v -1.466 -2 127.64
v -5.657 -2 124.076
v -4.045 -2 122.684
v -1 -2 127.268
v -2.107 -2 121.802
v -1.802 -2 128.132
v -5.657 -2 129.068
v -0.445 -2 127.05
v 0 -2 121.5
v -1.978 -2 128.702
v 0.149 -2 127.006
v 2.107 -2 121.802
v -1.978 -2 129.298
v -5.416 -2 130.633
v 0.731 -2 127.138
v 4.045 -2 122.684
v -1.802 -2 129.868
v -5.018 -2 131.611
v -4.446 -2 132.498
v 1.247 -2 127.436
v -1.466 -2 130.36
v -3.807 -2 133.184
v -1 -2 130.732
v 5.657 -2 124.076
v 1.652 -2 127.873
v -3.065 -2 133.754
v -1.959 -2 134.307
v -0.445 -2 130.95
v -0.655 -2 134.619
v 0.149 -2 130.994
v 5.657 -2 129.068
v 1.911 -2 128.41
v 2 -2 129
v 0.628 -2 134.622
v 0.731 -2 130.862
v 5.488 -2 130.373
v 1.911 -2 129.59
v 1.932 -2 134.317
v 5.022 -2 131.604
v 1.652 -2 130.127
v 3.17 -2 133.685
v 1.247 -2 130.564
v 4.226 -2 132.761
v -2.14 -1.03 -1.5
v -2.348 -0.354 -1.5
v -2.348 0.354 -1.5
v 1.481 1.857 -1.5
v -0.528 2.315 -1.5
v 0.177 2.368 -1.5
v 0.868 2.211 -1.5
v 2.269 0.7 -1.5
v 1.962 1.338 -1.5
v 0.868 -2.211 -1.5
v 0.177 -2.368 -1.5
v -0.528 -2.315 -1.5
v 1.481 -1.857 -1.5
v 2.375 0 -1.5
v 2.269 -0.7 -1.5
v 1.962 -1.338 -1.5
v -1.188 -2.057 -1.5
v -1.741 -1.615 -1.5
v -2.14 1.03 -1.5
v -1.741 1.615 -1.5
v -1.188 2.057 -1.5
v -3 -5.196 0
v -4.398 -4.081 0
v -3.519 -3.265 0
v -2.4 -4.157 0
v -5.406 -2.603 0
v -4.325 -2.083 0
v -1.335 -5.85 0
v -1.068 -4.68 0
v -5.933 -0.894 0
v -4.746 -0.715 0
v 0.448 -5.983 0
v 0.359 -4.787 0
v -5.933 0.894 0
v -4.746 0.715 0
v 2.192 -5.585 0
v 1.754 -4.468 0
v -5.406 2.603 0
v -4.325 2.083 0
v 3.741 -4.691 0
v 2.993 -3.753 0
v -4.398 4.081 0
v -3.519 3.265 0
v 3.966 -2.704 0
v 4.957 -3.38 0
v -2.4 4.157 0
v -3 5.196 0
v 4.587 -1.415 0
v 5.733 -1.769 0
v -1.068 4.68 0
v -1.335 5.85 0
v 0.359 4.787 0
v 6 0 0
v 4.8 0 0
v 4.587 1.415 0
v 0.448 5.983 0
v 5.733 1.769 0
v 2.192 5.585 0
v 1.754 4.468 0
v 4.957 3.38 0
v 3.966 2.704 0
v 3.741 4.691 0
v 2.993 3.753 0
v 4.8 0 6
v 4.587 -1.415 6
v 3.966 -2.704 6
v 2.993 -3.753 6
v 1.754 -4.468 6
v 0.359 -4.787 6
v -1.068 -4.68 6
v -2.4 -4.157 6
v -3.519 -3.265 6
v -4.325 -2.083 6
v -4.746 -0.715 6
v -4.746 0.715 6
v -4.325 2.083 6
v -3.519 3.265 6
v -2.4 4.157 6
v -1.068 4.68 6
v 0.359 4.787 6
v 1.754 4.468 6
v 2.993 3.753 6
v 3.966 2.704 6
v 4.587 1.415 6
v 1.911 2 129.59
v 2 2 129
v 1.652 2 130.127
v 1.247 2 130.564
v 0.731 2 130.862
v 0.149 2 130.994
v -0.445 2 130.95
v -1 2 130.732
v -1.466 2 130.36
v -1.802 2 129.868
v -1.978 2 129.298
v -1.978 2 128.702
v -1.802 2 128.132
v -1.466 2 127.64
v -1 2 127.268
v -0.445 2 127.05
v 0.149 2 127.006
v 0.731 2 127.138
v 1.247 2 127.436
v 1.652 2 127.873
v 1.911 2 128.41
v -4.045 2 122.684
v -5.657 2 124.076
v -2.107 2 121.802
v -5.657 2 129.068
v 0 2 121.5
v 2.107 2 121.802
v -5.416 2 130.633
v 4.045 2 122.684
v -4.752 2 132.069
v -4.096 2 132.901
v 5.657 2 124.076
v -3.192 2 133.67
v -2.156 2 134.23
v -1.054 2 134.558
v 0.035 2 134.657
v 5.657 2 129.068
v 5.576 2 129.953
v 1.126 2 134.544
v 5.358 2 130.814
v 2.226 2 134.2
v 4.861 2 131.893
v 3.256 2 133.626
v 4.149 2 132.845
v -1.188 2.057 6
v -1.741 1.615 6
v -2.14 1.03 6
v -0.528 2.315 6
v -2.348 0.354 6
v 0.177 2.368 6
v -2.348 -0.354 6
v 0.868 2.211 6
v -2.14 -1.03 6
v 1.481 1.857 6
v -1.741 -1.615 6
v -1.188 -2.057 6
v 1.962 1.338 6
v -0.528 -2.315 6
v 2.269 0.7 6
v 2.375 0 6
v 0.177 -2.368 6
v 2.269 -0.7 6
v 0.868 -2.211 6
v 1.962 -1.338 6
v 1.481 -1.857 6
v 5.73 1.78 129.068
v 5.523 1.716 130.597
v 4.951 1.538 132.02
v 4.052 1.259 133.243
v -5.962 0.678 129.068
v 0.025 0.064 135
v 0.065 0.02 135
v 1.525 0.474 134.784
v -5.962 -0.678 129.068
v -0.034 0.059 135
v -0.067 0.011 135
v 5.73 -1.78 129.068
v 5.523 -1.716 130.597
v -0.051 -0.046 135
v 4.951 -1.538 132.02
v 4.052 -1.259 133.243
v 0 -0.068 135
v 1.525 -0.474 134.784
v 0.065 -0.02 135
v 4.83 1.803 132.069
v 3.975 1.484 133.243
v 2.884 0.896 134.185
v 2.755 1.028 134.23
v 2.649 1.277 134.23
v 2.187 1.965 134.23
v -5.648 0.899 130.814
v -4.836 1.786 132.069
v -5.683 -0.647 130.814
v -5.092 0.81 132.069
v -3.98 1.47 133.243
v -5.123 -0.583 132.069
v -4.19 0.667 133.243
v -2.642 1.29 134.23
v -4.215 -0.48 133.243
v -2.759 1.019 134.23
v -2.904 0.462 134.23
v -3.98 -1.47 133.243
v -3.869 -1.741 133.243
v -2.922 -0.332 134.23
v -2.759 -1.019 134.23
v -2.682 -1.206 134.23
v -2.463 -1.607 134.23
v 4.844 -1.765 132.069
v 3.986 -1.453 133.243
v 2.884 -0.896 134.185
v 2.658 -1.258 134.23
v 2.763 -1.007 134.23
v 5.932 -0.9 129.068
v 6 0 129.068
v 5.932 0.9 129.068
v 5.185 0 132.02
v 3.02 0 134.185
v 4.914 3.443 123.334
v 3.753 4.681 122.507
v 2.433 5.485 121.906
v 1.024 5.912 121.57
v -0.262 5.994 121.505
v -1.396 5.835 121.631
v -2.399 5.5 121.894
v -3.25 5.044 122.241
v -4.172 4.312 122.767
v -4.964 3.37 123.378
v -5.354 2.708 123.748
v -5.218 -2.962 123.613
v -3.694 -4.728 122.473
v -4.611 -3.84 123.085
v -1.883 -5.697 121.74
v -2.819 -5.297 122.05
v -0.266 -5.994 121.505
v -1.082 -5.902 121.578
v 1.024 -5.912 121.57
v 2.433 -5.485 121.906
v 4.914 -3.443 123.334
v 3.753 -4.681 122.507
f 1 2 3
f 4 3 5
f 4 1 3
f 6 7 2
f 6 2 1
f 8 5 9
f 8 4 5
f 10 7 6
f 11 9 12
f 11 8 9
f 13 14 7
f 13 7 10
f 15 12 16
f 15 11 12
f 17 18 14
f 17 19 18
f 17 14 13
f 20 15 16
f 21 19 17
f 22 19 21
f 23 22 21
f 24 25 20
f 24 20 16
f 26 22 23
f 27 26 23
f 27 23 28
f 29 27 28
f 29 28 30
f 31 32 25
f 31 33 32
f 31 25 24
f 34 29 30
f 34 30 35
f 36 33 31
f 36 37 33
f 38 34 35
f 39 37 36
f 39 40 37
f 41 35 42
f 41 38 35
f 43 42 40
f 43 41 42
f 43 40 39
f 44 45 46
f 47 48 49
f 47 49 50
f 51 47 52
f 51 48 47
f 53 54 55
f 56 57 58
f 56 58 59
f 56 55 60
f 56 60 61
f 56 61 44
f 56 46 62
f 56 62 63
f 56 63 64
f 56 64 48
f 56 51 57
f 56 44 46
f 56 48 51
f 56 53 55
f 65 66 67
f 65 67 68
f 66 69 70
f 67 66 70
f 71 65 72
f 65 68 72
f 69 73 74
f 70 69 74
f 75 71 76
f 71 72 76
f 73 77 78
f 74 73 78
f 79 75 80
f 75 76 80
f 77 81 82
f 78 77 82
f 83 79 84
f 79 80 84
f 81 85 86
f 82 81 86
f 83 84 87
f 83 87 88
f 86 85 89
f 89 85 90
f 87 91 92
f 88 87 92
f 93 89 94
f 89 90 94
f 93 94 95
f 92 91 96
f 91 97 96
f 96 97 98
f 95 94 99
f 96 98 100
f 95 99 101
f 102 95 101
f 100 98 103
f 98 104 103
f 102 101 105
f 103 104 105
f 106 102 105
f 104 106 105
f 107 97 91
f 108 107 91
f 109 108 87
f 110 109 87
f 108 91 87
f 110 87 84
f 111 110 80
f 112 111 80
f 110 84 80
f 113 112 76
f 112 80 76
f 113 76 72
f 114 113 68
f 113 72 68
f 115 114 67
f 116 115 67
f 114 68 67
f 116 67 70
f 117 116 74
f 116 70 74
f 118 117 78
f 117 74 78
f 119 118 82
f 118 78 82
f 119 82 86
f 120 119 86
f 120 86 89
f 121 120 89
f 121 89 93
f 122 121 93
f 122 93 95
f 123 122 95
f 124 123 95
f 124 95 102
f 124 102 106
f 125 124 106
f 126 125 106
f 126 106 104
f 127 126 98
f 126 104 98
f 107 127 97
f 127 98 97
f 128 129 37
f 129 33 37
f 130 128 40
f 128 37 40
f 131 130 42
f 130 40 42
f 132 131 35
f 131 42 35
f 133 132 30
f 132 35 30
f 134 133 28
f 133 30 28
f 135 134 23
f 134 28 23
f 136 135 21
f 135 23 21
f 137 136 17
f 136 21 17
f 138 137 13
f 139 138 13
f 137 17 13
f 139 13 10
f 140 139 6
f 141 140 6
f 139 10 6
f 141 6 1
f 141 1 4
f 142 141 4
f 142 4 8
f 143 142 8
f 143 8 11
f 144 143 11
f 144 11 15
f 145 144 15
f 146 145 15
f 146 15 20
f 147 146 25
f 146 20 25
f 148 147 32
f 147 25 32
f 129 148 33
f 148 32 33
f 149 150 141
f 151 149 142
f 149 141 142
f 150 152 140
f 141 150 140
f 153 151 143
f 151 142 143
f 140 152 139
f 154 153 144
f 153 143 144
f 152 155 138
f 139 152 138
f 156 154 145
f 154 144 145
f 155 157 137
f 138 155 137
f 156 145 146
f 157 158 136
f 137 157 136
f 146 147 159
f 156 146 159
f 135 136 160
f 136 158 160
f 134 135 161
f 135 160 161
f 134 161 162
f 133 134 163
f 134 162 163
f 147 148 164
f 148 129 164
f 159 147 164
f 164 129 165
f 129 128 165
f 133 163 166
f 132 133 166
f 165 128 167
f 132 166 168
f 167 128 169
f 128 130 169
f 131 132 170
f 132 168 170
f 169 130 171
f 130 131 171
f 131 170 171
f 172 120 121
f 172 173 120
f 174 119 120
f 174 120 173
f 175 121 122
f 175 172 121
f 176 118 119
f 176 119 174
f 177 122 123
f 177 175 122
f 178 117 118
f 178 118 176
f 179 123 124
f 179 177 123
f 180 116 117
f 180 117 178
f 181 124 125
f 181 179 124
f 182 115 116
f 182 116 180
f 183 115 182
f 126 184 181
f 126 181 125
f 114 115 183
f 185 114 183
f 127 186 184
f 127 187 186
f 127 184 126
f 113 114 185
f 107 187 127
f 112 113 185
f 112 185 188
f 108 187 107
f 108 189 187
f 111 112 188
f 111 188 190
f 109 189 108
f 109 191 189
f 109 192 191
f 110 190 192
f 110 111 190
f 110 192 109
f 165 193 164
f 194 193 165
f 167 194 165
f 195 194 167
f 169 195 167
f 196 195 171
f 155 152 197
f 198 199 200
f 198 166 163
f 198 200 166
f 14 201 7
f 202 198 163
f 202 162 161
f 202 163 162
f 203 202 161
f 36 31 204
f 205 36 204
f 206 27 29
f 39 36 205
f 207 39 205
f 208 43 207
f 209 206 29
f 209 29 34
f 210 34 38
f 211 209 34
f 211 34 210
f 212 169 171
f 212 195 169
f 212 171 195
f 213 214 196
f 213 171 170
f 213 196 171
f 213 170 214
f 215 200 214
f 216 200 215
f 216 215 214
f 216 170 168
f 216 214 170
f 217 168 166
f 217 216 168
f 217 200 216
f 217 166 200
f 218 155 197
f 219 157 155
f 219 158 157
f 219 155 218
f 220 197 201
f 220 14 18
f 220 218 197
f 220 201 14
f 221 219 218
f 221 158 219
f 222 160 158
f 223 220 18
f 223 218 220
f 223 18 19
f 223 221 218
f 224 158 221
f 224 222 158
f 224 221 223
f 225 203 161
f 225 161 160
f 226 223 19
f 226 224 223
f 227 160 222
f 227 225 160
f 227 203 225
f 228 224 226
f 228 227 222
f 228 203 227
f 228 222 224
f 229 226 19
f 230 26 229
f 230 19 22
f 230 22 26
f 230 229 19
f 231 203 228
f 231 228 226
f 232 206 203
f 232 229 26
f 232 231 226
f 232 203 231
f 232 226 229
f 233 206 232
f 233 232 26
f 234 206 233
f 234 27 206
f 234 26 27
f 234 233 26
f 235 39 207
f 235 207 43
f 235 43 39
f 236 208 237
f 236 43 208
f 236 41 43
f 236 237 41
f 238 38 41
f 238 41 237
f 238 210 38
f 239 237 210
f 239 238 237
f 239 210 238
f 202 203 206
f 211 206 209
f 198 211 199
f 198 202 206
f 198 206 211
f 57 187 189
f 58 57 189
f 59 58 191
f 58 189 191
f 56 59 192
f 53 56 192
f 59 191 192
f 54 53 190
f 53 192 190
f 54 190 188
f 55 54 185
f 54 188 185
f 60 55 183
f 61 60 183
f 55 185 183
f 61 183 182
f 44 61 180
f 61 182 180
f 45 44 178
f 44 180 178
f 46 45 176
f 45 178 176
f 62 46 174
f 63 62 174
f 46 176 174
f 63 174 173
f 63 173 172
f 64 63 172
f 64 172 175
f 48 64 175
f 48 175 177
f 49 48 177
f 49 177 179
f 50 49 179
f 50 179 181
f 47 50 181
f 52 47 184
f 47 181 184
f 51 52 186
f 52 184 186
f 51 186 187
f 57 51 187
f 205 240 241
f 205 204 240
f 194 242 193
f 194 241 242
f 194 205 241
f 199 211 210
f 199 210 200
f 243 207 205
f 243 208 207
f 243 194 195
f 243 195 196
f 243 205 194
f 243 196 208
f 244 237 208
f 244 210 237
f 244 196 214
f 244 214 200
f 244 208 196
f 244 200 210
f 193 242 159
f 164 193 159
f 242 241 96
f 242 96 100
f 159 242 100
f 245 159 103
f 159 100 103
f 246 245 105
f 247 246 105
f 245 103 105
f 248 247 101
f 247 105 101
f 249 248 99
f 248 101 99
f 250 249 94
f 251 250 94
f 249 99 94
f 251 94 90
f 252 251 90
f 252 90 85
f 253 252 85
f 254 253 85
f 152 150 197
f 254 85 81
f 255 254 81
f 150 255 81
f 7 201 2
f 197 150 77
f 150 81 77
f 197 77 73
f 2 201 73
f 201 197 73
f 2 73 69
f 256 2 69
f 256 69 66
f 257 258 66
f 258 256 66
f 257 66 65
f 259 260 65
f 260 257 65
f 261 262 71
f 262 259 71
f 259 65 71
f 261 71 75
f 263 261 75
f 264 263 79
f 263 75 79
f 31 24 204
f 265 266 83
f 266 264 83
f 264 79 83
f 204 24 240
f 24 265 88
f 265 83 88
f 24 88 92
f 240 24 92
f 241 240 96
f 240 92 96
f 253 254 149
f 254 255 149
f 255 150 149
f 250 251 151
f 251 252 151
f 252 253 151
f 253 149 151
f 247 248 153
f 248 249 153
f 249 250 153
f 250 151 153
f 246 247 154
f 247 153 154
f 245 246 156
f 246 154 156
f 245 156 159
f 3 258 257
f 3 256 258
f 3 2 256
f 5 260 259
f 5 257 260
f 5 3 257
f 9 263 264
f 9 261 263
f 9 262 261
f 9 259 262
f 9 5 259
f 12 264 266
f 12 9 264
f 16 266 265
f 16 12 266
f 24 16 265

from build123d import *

# Parameters (mm, degrees)
F0_R        = 6
F1_DEPTH    = 135
F3_START    = -2
F3_DEPTH    = 4.0010001005
F4_START    = 2
F4_DEPTH    = 4
F5_T2_ANGLE = 325.4889919963
F5_T4_ANGLE = 306.0016128171
F5_T6_ANGLE = 306.0016128171
F6_R        = 2
F7_DEPTH    = 12.5
F8_R        = 4.8
F9_DEPTH    = 6
F10_R       = 2.375
F11_DEPTH   = 7.5


# Not quite as in the source:
# - a fillet or chamfer that OpenCascade refuses, or shapes differently, is made with other operations: its cross-section is extruded or revolved along the edge and cut away or added


with BuildPart() as f1:
    # F0 (on Top) → F1 (new body)
    with BuildSketch(Plane.XY):
        Circle(F0_R)
    extrude(amount=F1_DEPTH)

    # F2 (on Front) → F3 (cut)
    with BuildSketch(Plane.XZ.offset(F3_START)):
        with BuildLine():
            Line((-6.0225790367, 135.0244730711), (-6.0225790367, 124.5302637944))
            ThreePointArc((-6.0225790367, 124.5302637944), (0.1221735447, 121.5009951577), (6.1649857089, 124.7288232056))
            Line((6.1649857089, 124.7288232056), (6.1649857089, 135.0244730711))
            Line((6.1649857089, 135.0244730711), (-6.0225790367, 135.0244730711))
        make_face()
    extrude(amount=-F3_DEPTH, mode=Mode.SUBTRACT)

    # F2 (on Front) → F4 (cut)
    with BuildSketch(Plane.XZ.offset(F4_START)):
        with BuildLine():
            Line((-6.0225790367, 135.0244730711), (-6.0225790367, 124.5302637944))
            ThreePointArc((-6.0225790367, 124.5302637944), (0.1221735447, 121.5009951577), (6.1649857089, 124.7288232056))
            Line((6.1649857089, 124.7288232056), (6.1649857089, 135.0244730711))
            Line((6.1649857089, 135.0244730711), (-6.0225790367, 135.0244730711))
        make_face()
    extrude(amount=F4_DEPTH, mode=Mode.SUBTRACT)

    # F5: fillet of radius 6 on 3 edges, made by hand

    # F5_s1 → F5_t2 (revolve, cut)
    with BuildSketch(Plane(origin=(0, 0, 0), x_dir=(0, 0, 1), z_dir=(0.2966333156, -0.9549914534, 0))):
        with BuildLine():
            ThreePointArc((128.9990343146, -6.0004), (133.242299252, -4.2429820947), (135.0003999223, 0))
            Line((135.0003999223, 0), (135.6005365042, 0))
            Line((135.6005365042, 0), (135.6001365685, -6))
            Line((135.6001365685, -6), (135, -6.6001365685))
            ThreePointArc((135, -6.6001365685), (131.9995171573, -6.6001365685), (128.9990343146, -6.6005365685))
            Line((128.9990343146, -6.6005365685), (128.9990343146, -6.0004))
        make_face()
    revolve(axis=Axis((0, 0, 135), (0, 0, 1)), revolution_arc=F5_T2_ANGLE, mode=Mode.SUBTRACT)

    # F5_s3 → F5_t4 (revolve, cut)
    with BuildSketch(Plane(origin=(0, 0, 0), x_dir=(0, 0, 1), z_dir=(-0.5981120695, 0.8014124733, 0))):
        with BuildLine():
            ThreePointArc((128.9990343146, -6.0004), (133.242299252, -4.2429820947), (135.0003999223, 0))
            Line((135.0003999223, 0), (135.6005365042, 0))
            Line((135.6005365042, 0), (135.6001365685, -6))
            Line((135.6001365685, -6), (135, -6.6001365685))
            ThreePointArc((135, -6.6001365685), (131.9995171573, -6.6001365685), (128.9990343146, -6.6005365685))
            Line((128.9990343146, -6.6005365685), (128.9990343146, -6.0004))
        make_face()
    revolve(axis=Axis((0, 0, 135), (0, 0, 1)), revolution_arc=F5_T4_ANGLE, mode=Mode.SUBTRACT)

    # F5_s5 → F5_t6 (revolve, cut)
    with BuildSketch(Plane(origin=(0, 0, 0), x_dir=(0, 0, 1), z_dir=(-0.2967679759, 0.9549496157, 0))):
        with BuildLine():
            ThreePointArc((128.9990343146, -6.0004), (133.242299252, -4.2429820947), (135.0003999223, 0))
            Line((135.0003999223, 0), (135.6005365042, 0))
            Line((135.6005365042, 0), (135.6001365685, -6))
            Line((135.6001365685, -6), (135, -6.6001365685))
            ThreePointArc((135, -6.6001365685), (131.9995171573, -6.6001365685), (128.9990343146, -6.6005365685))
            Line((128.9990343146, -6.6005365685), (128.9990343146, -6.0004))
        make_face()
    revolve(axis=Axis((0, 0, 135), (0, 0, 1)), revolution_arc=F5_T6_ANGLE, mode=Mode.SUBTRACT)

    # F6 (on face) → F7 (cut, symmetric)
    with BuildSketch(Plane.XZ):
        with Locations((0, 129)):
            Circle(F6_R)
    extrude(amount=F7_DEPTH, both=True, mode=Mode.SUBTRACT)

    # F8 (on face) → F9 (cut)
    with BuildSketch(Plane(origin=(0, 0, 0), x_dir=(1, 0, 0), z_dir=(0, 0, -1))):
        Circle(F8_R)
    extrude(amount=-F9_DEPTH, mode=Mode.SUBTRACT)

    # F10 (on face) → F11 (join)
    with BuildSketch(Plane(origin=(0, 0, 6), x_dir=(1, 0, 0), z_dir=(0, 0, -1))):
        Circle(F10_R)
    extrude(amount=F11_DEPTH)


solid = f1.part
